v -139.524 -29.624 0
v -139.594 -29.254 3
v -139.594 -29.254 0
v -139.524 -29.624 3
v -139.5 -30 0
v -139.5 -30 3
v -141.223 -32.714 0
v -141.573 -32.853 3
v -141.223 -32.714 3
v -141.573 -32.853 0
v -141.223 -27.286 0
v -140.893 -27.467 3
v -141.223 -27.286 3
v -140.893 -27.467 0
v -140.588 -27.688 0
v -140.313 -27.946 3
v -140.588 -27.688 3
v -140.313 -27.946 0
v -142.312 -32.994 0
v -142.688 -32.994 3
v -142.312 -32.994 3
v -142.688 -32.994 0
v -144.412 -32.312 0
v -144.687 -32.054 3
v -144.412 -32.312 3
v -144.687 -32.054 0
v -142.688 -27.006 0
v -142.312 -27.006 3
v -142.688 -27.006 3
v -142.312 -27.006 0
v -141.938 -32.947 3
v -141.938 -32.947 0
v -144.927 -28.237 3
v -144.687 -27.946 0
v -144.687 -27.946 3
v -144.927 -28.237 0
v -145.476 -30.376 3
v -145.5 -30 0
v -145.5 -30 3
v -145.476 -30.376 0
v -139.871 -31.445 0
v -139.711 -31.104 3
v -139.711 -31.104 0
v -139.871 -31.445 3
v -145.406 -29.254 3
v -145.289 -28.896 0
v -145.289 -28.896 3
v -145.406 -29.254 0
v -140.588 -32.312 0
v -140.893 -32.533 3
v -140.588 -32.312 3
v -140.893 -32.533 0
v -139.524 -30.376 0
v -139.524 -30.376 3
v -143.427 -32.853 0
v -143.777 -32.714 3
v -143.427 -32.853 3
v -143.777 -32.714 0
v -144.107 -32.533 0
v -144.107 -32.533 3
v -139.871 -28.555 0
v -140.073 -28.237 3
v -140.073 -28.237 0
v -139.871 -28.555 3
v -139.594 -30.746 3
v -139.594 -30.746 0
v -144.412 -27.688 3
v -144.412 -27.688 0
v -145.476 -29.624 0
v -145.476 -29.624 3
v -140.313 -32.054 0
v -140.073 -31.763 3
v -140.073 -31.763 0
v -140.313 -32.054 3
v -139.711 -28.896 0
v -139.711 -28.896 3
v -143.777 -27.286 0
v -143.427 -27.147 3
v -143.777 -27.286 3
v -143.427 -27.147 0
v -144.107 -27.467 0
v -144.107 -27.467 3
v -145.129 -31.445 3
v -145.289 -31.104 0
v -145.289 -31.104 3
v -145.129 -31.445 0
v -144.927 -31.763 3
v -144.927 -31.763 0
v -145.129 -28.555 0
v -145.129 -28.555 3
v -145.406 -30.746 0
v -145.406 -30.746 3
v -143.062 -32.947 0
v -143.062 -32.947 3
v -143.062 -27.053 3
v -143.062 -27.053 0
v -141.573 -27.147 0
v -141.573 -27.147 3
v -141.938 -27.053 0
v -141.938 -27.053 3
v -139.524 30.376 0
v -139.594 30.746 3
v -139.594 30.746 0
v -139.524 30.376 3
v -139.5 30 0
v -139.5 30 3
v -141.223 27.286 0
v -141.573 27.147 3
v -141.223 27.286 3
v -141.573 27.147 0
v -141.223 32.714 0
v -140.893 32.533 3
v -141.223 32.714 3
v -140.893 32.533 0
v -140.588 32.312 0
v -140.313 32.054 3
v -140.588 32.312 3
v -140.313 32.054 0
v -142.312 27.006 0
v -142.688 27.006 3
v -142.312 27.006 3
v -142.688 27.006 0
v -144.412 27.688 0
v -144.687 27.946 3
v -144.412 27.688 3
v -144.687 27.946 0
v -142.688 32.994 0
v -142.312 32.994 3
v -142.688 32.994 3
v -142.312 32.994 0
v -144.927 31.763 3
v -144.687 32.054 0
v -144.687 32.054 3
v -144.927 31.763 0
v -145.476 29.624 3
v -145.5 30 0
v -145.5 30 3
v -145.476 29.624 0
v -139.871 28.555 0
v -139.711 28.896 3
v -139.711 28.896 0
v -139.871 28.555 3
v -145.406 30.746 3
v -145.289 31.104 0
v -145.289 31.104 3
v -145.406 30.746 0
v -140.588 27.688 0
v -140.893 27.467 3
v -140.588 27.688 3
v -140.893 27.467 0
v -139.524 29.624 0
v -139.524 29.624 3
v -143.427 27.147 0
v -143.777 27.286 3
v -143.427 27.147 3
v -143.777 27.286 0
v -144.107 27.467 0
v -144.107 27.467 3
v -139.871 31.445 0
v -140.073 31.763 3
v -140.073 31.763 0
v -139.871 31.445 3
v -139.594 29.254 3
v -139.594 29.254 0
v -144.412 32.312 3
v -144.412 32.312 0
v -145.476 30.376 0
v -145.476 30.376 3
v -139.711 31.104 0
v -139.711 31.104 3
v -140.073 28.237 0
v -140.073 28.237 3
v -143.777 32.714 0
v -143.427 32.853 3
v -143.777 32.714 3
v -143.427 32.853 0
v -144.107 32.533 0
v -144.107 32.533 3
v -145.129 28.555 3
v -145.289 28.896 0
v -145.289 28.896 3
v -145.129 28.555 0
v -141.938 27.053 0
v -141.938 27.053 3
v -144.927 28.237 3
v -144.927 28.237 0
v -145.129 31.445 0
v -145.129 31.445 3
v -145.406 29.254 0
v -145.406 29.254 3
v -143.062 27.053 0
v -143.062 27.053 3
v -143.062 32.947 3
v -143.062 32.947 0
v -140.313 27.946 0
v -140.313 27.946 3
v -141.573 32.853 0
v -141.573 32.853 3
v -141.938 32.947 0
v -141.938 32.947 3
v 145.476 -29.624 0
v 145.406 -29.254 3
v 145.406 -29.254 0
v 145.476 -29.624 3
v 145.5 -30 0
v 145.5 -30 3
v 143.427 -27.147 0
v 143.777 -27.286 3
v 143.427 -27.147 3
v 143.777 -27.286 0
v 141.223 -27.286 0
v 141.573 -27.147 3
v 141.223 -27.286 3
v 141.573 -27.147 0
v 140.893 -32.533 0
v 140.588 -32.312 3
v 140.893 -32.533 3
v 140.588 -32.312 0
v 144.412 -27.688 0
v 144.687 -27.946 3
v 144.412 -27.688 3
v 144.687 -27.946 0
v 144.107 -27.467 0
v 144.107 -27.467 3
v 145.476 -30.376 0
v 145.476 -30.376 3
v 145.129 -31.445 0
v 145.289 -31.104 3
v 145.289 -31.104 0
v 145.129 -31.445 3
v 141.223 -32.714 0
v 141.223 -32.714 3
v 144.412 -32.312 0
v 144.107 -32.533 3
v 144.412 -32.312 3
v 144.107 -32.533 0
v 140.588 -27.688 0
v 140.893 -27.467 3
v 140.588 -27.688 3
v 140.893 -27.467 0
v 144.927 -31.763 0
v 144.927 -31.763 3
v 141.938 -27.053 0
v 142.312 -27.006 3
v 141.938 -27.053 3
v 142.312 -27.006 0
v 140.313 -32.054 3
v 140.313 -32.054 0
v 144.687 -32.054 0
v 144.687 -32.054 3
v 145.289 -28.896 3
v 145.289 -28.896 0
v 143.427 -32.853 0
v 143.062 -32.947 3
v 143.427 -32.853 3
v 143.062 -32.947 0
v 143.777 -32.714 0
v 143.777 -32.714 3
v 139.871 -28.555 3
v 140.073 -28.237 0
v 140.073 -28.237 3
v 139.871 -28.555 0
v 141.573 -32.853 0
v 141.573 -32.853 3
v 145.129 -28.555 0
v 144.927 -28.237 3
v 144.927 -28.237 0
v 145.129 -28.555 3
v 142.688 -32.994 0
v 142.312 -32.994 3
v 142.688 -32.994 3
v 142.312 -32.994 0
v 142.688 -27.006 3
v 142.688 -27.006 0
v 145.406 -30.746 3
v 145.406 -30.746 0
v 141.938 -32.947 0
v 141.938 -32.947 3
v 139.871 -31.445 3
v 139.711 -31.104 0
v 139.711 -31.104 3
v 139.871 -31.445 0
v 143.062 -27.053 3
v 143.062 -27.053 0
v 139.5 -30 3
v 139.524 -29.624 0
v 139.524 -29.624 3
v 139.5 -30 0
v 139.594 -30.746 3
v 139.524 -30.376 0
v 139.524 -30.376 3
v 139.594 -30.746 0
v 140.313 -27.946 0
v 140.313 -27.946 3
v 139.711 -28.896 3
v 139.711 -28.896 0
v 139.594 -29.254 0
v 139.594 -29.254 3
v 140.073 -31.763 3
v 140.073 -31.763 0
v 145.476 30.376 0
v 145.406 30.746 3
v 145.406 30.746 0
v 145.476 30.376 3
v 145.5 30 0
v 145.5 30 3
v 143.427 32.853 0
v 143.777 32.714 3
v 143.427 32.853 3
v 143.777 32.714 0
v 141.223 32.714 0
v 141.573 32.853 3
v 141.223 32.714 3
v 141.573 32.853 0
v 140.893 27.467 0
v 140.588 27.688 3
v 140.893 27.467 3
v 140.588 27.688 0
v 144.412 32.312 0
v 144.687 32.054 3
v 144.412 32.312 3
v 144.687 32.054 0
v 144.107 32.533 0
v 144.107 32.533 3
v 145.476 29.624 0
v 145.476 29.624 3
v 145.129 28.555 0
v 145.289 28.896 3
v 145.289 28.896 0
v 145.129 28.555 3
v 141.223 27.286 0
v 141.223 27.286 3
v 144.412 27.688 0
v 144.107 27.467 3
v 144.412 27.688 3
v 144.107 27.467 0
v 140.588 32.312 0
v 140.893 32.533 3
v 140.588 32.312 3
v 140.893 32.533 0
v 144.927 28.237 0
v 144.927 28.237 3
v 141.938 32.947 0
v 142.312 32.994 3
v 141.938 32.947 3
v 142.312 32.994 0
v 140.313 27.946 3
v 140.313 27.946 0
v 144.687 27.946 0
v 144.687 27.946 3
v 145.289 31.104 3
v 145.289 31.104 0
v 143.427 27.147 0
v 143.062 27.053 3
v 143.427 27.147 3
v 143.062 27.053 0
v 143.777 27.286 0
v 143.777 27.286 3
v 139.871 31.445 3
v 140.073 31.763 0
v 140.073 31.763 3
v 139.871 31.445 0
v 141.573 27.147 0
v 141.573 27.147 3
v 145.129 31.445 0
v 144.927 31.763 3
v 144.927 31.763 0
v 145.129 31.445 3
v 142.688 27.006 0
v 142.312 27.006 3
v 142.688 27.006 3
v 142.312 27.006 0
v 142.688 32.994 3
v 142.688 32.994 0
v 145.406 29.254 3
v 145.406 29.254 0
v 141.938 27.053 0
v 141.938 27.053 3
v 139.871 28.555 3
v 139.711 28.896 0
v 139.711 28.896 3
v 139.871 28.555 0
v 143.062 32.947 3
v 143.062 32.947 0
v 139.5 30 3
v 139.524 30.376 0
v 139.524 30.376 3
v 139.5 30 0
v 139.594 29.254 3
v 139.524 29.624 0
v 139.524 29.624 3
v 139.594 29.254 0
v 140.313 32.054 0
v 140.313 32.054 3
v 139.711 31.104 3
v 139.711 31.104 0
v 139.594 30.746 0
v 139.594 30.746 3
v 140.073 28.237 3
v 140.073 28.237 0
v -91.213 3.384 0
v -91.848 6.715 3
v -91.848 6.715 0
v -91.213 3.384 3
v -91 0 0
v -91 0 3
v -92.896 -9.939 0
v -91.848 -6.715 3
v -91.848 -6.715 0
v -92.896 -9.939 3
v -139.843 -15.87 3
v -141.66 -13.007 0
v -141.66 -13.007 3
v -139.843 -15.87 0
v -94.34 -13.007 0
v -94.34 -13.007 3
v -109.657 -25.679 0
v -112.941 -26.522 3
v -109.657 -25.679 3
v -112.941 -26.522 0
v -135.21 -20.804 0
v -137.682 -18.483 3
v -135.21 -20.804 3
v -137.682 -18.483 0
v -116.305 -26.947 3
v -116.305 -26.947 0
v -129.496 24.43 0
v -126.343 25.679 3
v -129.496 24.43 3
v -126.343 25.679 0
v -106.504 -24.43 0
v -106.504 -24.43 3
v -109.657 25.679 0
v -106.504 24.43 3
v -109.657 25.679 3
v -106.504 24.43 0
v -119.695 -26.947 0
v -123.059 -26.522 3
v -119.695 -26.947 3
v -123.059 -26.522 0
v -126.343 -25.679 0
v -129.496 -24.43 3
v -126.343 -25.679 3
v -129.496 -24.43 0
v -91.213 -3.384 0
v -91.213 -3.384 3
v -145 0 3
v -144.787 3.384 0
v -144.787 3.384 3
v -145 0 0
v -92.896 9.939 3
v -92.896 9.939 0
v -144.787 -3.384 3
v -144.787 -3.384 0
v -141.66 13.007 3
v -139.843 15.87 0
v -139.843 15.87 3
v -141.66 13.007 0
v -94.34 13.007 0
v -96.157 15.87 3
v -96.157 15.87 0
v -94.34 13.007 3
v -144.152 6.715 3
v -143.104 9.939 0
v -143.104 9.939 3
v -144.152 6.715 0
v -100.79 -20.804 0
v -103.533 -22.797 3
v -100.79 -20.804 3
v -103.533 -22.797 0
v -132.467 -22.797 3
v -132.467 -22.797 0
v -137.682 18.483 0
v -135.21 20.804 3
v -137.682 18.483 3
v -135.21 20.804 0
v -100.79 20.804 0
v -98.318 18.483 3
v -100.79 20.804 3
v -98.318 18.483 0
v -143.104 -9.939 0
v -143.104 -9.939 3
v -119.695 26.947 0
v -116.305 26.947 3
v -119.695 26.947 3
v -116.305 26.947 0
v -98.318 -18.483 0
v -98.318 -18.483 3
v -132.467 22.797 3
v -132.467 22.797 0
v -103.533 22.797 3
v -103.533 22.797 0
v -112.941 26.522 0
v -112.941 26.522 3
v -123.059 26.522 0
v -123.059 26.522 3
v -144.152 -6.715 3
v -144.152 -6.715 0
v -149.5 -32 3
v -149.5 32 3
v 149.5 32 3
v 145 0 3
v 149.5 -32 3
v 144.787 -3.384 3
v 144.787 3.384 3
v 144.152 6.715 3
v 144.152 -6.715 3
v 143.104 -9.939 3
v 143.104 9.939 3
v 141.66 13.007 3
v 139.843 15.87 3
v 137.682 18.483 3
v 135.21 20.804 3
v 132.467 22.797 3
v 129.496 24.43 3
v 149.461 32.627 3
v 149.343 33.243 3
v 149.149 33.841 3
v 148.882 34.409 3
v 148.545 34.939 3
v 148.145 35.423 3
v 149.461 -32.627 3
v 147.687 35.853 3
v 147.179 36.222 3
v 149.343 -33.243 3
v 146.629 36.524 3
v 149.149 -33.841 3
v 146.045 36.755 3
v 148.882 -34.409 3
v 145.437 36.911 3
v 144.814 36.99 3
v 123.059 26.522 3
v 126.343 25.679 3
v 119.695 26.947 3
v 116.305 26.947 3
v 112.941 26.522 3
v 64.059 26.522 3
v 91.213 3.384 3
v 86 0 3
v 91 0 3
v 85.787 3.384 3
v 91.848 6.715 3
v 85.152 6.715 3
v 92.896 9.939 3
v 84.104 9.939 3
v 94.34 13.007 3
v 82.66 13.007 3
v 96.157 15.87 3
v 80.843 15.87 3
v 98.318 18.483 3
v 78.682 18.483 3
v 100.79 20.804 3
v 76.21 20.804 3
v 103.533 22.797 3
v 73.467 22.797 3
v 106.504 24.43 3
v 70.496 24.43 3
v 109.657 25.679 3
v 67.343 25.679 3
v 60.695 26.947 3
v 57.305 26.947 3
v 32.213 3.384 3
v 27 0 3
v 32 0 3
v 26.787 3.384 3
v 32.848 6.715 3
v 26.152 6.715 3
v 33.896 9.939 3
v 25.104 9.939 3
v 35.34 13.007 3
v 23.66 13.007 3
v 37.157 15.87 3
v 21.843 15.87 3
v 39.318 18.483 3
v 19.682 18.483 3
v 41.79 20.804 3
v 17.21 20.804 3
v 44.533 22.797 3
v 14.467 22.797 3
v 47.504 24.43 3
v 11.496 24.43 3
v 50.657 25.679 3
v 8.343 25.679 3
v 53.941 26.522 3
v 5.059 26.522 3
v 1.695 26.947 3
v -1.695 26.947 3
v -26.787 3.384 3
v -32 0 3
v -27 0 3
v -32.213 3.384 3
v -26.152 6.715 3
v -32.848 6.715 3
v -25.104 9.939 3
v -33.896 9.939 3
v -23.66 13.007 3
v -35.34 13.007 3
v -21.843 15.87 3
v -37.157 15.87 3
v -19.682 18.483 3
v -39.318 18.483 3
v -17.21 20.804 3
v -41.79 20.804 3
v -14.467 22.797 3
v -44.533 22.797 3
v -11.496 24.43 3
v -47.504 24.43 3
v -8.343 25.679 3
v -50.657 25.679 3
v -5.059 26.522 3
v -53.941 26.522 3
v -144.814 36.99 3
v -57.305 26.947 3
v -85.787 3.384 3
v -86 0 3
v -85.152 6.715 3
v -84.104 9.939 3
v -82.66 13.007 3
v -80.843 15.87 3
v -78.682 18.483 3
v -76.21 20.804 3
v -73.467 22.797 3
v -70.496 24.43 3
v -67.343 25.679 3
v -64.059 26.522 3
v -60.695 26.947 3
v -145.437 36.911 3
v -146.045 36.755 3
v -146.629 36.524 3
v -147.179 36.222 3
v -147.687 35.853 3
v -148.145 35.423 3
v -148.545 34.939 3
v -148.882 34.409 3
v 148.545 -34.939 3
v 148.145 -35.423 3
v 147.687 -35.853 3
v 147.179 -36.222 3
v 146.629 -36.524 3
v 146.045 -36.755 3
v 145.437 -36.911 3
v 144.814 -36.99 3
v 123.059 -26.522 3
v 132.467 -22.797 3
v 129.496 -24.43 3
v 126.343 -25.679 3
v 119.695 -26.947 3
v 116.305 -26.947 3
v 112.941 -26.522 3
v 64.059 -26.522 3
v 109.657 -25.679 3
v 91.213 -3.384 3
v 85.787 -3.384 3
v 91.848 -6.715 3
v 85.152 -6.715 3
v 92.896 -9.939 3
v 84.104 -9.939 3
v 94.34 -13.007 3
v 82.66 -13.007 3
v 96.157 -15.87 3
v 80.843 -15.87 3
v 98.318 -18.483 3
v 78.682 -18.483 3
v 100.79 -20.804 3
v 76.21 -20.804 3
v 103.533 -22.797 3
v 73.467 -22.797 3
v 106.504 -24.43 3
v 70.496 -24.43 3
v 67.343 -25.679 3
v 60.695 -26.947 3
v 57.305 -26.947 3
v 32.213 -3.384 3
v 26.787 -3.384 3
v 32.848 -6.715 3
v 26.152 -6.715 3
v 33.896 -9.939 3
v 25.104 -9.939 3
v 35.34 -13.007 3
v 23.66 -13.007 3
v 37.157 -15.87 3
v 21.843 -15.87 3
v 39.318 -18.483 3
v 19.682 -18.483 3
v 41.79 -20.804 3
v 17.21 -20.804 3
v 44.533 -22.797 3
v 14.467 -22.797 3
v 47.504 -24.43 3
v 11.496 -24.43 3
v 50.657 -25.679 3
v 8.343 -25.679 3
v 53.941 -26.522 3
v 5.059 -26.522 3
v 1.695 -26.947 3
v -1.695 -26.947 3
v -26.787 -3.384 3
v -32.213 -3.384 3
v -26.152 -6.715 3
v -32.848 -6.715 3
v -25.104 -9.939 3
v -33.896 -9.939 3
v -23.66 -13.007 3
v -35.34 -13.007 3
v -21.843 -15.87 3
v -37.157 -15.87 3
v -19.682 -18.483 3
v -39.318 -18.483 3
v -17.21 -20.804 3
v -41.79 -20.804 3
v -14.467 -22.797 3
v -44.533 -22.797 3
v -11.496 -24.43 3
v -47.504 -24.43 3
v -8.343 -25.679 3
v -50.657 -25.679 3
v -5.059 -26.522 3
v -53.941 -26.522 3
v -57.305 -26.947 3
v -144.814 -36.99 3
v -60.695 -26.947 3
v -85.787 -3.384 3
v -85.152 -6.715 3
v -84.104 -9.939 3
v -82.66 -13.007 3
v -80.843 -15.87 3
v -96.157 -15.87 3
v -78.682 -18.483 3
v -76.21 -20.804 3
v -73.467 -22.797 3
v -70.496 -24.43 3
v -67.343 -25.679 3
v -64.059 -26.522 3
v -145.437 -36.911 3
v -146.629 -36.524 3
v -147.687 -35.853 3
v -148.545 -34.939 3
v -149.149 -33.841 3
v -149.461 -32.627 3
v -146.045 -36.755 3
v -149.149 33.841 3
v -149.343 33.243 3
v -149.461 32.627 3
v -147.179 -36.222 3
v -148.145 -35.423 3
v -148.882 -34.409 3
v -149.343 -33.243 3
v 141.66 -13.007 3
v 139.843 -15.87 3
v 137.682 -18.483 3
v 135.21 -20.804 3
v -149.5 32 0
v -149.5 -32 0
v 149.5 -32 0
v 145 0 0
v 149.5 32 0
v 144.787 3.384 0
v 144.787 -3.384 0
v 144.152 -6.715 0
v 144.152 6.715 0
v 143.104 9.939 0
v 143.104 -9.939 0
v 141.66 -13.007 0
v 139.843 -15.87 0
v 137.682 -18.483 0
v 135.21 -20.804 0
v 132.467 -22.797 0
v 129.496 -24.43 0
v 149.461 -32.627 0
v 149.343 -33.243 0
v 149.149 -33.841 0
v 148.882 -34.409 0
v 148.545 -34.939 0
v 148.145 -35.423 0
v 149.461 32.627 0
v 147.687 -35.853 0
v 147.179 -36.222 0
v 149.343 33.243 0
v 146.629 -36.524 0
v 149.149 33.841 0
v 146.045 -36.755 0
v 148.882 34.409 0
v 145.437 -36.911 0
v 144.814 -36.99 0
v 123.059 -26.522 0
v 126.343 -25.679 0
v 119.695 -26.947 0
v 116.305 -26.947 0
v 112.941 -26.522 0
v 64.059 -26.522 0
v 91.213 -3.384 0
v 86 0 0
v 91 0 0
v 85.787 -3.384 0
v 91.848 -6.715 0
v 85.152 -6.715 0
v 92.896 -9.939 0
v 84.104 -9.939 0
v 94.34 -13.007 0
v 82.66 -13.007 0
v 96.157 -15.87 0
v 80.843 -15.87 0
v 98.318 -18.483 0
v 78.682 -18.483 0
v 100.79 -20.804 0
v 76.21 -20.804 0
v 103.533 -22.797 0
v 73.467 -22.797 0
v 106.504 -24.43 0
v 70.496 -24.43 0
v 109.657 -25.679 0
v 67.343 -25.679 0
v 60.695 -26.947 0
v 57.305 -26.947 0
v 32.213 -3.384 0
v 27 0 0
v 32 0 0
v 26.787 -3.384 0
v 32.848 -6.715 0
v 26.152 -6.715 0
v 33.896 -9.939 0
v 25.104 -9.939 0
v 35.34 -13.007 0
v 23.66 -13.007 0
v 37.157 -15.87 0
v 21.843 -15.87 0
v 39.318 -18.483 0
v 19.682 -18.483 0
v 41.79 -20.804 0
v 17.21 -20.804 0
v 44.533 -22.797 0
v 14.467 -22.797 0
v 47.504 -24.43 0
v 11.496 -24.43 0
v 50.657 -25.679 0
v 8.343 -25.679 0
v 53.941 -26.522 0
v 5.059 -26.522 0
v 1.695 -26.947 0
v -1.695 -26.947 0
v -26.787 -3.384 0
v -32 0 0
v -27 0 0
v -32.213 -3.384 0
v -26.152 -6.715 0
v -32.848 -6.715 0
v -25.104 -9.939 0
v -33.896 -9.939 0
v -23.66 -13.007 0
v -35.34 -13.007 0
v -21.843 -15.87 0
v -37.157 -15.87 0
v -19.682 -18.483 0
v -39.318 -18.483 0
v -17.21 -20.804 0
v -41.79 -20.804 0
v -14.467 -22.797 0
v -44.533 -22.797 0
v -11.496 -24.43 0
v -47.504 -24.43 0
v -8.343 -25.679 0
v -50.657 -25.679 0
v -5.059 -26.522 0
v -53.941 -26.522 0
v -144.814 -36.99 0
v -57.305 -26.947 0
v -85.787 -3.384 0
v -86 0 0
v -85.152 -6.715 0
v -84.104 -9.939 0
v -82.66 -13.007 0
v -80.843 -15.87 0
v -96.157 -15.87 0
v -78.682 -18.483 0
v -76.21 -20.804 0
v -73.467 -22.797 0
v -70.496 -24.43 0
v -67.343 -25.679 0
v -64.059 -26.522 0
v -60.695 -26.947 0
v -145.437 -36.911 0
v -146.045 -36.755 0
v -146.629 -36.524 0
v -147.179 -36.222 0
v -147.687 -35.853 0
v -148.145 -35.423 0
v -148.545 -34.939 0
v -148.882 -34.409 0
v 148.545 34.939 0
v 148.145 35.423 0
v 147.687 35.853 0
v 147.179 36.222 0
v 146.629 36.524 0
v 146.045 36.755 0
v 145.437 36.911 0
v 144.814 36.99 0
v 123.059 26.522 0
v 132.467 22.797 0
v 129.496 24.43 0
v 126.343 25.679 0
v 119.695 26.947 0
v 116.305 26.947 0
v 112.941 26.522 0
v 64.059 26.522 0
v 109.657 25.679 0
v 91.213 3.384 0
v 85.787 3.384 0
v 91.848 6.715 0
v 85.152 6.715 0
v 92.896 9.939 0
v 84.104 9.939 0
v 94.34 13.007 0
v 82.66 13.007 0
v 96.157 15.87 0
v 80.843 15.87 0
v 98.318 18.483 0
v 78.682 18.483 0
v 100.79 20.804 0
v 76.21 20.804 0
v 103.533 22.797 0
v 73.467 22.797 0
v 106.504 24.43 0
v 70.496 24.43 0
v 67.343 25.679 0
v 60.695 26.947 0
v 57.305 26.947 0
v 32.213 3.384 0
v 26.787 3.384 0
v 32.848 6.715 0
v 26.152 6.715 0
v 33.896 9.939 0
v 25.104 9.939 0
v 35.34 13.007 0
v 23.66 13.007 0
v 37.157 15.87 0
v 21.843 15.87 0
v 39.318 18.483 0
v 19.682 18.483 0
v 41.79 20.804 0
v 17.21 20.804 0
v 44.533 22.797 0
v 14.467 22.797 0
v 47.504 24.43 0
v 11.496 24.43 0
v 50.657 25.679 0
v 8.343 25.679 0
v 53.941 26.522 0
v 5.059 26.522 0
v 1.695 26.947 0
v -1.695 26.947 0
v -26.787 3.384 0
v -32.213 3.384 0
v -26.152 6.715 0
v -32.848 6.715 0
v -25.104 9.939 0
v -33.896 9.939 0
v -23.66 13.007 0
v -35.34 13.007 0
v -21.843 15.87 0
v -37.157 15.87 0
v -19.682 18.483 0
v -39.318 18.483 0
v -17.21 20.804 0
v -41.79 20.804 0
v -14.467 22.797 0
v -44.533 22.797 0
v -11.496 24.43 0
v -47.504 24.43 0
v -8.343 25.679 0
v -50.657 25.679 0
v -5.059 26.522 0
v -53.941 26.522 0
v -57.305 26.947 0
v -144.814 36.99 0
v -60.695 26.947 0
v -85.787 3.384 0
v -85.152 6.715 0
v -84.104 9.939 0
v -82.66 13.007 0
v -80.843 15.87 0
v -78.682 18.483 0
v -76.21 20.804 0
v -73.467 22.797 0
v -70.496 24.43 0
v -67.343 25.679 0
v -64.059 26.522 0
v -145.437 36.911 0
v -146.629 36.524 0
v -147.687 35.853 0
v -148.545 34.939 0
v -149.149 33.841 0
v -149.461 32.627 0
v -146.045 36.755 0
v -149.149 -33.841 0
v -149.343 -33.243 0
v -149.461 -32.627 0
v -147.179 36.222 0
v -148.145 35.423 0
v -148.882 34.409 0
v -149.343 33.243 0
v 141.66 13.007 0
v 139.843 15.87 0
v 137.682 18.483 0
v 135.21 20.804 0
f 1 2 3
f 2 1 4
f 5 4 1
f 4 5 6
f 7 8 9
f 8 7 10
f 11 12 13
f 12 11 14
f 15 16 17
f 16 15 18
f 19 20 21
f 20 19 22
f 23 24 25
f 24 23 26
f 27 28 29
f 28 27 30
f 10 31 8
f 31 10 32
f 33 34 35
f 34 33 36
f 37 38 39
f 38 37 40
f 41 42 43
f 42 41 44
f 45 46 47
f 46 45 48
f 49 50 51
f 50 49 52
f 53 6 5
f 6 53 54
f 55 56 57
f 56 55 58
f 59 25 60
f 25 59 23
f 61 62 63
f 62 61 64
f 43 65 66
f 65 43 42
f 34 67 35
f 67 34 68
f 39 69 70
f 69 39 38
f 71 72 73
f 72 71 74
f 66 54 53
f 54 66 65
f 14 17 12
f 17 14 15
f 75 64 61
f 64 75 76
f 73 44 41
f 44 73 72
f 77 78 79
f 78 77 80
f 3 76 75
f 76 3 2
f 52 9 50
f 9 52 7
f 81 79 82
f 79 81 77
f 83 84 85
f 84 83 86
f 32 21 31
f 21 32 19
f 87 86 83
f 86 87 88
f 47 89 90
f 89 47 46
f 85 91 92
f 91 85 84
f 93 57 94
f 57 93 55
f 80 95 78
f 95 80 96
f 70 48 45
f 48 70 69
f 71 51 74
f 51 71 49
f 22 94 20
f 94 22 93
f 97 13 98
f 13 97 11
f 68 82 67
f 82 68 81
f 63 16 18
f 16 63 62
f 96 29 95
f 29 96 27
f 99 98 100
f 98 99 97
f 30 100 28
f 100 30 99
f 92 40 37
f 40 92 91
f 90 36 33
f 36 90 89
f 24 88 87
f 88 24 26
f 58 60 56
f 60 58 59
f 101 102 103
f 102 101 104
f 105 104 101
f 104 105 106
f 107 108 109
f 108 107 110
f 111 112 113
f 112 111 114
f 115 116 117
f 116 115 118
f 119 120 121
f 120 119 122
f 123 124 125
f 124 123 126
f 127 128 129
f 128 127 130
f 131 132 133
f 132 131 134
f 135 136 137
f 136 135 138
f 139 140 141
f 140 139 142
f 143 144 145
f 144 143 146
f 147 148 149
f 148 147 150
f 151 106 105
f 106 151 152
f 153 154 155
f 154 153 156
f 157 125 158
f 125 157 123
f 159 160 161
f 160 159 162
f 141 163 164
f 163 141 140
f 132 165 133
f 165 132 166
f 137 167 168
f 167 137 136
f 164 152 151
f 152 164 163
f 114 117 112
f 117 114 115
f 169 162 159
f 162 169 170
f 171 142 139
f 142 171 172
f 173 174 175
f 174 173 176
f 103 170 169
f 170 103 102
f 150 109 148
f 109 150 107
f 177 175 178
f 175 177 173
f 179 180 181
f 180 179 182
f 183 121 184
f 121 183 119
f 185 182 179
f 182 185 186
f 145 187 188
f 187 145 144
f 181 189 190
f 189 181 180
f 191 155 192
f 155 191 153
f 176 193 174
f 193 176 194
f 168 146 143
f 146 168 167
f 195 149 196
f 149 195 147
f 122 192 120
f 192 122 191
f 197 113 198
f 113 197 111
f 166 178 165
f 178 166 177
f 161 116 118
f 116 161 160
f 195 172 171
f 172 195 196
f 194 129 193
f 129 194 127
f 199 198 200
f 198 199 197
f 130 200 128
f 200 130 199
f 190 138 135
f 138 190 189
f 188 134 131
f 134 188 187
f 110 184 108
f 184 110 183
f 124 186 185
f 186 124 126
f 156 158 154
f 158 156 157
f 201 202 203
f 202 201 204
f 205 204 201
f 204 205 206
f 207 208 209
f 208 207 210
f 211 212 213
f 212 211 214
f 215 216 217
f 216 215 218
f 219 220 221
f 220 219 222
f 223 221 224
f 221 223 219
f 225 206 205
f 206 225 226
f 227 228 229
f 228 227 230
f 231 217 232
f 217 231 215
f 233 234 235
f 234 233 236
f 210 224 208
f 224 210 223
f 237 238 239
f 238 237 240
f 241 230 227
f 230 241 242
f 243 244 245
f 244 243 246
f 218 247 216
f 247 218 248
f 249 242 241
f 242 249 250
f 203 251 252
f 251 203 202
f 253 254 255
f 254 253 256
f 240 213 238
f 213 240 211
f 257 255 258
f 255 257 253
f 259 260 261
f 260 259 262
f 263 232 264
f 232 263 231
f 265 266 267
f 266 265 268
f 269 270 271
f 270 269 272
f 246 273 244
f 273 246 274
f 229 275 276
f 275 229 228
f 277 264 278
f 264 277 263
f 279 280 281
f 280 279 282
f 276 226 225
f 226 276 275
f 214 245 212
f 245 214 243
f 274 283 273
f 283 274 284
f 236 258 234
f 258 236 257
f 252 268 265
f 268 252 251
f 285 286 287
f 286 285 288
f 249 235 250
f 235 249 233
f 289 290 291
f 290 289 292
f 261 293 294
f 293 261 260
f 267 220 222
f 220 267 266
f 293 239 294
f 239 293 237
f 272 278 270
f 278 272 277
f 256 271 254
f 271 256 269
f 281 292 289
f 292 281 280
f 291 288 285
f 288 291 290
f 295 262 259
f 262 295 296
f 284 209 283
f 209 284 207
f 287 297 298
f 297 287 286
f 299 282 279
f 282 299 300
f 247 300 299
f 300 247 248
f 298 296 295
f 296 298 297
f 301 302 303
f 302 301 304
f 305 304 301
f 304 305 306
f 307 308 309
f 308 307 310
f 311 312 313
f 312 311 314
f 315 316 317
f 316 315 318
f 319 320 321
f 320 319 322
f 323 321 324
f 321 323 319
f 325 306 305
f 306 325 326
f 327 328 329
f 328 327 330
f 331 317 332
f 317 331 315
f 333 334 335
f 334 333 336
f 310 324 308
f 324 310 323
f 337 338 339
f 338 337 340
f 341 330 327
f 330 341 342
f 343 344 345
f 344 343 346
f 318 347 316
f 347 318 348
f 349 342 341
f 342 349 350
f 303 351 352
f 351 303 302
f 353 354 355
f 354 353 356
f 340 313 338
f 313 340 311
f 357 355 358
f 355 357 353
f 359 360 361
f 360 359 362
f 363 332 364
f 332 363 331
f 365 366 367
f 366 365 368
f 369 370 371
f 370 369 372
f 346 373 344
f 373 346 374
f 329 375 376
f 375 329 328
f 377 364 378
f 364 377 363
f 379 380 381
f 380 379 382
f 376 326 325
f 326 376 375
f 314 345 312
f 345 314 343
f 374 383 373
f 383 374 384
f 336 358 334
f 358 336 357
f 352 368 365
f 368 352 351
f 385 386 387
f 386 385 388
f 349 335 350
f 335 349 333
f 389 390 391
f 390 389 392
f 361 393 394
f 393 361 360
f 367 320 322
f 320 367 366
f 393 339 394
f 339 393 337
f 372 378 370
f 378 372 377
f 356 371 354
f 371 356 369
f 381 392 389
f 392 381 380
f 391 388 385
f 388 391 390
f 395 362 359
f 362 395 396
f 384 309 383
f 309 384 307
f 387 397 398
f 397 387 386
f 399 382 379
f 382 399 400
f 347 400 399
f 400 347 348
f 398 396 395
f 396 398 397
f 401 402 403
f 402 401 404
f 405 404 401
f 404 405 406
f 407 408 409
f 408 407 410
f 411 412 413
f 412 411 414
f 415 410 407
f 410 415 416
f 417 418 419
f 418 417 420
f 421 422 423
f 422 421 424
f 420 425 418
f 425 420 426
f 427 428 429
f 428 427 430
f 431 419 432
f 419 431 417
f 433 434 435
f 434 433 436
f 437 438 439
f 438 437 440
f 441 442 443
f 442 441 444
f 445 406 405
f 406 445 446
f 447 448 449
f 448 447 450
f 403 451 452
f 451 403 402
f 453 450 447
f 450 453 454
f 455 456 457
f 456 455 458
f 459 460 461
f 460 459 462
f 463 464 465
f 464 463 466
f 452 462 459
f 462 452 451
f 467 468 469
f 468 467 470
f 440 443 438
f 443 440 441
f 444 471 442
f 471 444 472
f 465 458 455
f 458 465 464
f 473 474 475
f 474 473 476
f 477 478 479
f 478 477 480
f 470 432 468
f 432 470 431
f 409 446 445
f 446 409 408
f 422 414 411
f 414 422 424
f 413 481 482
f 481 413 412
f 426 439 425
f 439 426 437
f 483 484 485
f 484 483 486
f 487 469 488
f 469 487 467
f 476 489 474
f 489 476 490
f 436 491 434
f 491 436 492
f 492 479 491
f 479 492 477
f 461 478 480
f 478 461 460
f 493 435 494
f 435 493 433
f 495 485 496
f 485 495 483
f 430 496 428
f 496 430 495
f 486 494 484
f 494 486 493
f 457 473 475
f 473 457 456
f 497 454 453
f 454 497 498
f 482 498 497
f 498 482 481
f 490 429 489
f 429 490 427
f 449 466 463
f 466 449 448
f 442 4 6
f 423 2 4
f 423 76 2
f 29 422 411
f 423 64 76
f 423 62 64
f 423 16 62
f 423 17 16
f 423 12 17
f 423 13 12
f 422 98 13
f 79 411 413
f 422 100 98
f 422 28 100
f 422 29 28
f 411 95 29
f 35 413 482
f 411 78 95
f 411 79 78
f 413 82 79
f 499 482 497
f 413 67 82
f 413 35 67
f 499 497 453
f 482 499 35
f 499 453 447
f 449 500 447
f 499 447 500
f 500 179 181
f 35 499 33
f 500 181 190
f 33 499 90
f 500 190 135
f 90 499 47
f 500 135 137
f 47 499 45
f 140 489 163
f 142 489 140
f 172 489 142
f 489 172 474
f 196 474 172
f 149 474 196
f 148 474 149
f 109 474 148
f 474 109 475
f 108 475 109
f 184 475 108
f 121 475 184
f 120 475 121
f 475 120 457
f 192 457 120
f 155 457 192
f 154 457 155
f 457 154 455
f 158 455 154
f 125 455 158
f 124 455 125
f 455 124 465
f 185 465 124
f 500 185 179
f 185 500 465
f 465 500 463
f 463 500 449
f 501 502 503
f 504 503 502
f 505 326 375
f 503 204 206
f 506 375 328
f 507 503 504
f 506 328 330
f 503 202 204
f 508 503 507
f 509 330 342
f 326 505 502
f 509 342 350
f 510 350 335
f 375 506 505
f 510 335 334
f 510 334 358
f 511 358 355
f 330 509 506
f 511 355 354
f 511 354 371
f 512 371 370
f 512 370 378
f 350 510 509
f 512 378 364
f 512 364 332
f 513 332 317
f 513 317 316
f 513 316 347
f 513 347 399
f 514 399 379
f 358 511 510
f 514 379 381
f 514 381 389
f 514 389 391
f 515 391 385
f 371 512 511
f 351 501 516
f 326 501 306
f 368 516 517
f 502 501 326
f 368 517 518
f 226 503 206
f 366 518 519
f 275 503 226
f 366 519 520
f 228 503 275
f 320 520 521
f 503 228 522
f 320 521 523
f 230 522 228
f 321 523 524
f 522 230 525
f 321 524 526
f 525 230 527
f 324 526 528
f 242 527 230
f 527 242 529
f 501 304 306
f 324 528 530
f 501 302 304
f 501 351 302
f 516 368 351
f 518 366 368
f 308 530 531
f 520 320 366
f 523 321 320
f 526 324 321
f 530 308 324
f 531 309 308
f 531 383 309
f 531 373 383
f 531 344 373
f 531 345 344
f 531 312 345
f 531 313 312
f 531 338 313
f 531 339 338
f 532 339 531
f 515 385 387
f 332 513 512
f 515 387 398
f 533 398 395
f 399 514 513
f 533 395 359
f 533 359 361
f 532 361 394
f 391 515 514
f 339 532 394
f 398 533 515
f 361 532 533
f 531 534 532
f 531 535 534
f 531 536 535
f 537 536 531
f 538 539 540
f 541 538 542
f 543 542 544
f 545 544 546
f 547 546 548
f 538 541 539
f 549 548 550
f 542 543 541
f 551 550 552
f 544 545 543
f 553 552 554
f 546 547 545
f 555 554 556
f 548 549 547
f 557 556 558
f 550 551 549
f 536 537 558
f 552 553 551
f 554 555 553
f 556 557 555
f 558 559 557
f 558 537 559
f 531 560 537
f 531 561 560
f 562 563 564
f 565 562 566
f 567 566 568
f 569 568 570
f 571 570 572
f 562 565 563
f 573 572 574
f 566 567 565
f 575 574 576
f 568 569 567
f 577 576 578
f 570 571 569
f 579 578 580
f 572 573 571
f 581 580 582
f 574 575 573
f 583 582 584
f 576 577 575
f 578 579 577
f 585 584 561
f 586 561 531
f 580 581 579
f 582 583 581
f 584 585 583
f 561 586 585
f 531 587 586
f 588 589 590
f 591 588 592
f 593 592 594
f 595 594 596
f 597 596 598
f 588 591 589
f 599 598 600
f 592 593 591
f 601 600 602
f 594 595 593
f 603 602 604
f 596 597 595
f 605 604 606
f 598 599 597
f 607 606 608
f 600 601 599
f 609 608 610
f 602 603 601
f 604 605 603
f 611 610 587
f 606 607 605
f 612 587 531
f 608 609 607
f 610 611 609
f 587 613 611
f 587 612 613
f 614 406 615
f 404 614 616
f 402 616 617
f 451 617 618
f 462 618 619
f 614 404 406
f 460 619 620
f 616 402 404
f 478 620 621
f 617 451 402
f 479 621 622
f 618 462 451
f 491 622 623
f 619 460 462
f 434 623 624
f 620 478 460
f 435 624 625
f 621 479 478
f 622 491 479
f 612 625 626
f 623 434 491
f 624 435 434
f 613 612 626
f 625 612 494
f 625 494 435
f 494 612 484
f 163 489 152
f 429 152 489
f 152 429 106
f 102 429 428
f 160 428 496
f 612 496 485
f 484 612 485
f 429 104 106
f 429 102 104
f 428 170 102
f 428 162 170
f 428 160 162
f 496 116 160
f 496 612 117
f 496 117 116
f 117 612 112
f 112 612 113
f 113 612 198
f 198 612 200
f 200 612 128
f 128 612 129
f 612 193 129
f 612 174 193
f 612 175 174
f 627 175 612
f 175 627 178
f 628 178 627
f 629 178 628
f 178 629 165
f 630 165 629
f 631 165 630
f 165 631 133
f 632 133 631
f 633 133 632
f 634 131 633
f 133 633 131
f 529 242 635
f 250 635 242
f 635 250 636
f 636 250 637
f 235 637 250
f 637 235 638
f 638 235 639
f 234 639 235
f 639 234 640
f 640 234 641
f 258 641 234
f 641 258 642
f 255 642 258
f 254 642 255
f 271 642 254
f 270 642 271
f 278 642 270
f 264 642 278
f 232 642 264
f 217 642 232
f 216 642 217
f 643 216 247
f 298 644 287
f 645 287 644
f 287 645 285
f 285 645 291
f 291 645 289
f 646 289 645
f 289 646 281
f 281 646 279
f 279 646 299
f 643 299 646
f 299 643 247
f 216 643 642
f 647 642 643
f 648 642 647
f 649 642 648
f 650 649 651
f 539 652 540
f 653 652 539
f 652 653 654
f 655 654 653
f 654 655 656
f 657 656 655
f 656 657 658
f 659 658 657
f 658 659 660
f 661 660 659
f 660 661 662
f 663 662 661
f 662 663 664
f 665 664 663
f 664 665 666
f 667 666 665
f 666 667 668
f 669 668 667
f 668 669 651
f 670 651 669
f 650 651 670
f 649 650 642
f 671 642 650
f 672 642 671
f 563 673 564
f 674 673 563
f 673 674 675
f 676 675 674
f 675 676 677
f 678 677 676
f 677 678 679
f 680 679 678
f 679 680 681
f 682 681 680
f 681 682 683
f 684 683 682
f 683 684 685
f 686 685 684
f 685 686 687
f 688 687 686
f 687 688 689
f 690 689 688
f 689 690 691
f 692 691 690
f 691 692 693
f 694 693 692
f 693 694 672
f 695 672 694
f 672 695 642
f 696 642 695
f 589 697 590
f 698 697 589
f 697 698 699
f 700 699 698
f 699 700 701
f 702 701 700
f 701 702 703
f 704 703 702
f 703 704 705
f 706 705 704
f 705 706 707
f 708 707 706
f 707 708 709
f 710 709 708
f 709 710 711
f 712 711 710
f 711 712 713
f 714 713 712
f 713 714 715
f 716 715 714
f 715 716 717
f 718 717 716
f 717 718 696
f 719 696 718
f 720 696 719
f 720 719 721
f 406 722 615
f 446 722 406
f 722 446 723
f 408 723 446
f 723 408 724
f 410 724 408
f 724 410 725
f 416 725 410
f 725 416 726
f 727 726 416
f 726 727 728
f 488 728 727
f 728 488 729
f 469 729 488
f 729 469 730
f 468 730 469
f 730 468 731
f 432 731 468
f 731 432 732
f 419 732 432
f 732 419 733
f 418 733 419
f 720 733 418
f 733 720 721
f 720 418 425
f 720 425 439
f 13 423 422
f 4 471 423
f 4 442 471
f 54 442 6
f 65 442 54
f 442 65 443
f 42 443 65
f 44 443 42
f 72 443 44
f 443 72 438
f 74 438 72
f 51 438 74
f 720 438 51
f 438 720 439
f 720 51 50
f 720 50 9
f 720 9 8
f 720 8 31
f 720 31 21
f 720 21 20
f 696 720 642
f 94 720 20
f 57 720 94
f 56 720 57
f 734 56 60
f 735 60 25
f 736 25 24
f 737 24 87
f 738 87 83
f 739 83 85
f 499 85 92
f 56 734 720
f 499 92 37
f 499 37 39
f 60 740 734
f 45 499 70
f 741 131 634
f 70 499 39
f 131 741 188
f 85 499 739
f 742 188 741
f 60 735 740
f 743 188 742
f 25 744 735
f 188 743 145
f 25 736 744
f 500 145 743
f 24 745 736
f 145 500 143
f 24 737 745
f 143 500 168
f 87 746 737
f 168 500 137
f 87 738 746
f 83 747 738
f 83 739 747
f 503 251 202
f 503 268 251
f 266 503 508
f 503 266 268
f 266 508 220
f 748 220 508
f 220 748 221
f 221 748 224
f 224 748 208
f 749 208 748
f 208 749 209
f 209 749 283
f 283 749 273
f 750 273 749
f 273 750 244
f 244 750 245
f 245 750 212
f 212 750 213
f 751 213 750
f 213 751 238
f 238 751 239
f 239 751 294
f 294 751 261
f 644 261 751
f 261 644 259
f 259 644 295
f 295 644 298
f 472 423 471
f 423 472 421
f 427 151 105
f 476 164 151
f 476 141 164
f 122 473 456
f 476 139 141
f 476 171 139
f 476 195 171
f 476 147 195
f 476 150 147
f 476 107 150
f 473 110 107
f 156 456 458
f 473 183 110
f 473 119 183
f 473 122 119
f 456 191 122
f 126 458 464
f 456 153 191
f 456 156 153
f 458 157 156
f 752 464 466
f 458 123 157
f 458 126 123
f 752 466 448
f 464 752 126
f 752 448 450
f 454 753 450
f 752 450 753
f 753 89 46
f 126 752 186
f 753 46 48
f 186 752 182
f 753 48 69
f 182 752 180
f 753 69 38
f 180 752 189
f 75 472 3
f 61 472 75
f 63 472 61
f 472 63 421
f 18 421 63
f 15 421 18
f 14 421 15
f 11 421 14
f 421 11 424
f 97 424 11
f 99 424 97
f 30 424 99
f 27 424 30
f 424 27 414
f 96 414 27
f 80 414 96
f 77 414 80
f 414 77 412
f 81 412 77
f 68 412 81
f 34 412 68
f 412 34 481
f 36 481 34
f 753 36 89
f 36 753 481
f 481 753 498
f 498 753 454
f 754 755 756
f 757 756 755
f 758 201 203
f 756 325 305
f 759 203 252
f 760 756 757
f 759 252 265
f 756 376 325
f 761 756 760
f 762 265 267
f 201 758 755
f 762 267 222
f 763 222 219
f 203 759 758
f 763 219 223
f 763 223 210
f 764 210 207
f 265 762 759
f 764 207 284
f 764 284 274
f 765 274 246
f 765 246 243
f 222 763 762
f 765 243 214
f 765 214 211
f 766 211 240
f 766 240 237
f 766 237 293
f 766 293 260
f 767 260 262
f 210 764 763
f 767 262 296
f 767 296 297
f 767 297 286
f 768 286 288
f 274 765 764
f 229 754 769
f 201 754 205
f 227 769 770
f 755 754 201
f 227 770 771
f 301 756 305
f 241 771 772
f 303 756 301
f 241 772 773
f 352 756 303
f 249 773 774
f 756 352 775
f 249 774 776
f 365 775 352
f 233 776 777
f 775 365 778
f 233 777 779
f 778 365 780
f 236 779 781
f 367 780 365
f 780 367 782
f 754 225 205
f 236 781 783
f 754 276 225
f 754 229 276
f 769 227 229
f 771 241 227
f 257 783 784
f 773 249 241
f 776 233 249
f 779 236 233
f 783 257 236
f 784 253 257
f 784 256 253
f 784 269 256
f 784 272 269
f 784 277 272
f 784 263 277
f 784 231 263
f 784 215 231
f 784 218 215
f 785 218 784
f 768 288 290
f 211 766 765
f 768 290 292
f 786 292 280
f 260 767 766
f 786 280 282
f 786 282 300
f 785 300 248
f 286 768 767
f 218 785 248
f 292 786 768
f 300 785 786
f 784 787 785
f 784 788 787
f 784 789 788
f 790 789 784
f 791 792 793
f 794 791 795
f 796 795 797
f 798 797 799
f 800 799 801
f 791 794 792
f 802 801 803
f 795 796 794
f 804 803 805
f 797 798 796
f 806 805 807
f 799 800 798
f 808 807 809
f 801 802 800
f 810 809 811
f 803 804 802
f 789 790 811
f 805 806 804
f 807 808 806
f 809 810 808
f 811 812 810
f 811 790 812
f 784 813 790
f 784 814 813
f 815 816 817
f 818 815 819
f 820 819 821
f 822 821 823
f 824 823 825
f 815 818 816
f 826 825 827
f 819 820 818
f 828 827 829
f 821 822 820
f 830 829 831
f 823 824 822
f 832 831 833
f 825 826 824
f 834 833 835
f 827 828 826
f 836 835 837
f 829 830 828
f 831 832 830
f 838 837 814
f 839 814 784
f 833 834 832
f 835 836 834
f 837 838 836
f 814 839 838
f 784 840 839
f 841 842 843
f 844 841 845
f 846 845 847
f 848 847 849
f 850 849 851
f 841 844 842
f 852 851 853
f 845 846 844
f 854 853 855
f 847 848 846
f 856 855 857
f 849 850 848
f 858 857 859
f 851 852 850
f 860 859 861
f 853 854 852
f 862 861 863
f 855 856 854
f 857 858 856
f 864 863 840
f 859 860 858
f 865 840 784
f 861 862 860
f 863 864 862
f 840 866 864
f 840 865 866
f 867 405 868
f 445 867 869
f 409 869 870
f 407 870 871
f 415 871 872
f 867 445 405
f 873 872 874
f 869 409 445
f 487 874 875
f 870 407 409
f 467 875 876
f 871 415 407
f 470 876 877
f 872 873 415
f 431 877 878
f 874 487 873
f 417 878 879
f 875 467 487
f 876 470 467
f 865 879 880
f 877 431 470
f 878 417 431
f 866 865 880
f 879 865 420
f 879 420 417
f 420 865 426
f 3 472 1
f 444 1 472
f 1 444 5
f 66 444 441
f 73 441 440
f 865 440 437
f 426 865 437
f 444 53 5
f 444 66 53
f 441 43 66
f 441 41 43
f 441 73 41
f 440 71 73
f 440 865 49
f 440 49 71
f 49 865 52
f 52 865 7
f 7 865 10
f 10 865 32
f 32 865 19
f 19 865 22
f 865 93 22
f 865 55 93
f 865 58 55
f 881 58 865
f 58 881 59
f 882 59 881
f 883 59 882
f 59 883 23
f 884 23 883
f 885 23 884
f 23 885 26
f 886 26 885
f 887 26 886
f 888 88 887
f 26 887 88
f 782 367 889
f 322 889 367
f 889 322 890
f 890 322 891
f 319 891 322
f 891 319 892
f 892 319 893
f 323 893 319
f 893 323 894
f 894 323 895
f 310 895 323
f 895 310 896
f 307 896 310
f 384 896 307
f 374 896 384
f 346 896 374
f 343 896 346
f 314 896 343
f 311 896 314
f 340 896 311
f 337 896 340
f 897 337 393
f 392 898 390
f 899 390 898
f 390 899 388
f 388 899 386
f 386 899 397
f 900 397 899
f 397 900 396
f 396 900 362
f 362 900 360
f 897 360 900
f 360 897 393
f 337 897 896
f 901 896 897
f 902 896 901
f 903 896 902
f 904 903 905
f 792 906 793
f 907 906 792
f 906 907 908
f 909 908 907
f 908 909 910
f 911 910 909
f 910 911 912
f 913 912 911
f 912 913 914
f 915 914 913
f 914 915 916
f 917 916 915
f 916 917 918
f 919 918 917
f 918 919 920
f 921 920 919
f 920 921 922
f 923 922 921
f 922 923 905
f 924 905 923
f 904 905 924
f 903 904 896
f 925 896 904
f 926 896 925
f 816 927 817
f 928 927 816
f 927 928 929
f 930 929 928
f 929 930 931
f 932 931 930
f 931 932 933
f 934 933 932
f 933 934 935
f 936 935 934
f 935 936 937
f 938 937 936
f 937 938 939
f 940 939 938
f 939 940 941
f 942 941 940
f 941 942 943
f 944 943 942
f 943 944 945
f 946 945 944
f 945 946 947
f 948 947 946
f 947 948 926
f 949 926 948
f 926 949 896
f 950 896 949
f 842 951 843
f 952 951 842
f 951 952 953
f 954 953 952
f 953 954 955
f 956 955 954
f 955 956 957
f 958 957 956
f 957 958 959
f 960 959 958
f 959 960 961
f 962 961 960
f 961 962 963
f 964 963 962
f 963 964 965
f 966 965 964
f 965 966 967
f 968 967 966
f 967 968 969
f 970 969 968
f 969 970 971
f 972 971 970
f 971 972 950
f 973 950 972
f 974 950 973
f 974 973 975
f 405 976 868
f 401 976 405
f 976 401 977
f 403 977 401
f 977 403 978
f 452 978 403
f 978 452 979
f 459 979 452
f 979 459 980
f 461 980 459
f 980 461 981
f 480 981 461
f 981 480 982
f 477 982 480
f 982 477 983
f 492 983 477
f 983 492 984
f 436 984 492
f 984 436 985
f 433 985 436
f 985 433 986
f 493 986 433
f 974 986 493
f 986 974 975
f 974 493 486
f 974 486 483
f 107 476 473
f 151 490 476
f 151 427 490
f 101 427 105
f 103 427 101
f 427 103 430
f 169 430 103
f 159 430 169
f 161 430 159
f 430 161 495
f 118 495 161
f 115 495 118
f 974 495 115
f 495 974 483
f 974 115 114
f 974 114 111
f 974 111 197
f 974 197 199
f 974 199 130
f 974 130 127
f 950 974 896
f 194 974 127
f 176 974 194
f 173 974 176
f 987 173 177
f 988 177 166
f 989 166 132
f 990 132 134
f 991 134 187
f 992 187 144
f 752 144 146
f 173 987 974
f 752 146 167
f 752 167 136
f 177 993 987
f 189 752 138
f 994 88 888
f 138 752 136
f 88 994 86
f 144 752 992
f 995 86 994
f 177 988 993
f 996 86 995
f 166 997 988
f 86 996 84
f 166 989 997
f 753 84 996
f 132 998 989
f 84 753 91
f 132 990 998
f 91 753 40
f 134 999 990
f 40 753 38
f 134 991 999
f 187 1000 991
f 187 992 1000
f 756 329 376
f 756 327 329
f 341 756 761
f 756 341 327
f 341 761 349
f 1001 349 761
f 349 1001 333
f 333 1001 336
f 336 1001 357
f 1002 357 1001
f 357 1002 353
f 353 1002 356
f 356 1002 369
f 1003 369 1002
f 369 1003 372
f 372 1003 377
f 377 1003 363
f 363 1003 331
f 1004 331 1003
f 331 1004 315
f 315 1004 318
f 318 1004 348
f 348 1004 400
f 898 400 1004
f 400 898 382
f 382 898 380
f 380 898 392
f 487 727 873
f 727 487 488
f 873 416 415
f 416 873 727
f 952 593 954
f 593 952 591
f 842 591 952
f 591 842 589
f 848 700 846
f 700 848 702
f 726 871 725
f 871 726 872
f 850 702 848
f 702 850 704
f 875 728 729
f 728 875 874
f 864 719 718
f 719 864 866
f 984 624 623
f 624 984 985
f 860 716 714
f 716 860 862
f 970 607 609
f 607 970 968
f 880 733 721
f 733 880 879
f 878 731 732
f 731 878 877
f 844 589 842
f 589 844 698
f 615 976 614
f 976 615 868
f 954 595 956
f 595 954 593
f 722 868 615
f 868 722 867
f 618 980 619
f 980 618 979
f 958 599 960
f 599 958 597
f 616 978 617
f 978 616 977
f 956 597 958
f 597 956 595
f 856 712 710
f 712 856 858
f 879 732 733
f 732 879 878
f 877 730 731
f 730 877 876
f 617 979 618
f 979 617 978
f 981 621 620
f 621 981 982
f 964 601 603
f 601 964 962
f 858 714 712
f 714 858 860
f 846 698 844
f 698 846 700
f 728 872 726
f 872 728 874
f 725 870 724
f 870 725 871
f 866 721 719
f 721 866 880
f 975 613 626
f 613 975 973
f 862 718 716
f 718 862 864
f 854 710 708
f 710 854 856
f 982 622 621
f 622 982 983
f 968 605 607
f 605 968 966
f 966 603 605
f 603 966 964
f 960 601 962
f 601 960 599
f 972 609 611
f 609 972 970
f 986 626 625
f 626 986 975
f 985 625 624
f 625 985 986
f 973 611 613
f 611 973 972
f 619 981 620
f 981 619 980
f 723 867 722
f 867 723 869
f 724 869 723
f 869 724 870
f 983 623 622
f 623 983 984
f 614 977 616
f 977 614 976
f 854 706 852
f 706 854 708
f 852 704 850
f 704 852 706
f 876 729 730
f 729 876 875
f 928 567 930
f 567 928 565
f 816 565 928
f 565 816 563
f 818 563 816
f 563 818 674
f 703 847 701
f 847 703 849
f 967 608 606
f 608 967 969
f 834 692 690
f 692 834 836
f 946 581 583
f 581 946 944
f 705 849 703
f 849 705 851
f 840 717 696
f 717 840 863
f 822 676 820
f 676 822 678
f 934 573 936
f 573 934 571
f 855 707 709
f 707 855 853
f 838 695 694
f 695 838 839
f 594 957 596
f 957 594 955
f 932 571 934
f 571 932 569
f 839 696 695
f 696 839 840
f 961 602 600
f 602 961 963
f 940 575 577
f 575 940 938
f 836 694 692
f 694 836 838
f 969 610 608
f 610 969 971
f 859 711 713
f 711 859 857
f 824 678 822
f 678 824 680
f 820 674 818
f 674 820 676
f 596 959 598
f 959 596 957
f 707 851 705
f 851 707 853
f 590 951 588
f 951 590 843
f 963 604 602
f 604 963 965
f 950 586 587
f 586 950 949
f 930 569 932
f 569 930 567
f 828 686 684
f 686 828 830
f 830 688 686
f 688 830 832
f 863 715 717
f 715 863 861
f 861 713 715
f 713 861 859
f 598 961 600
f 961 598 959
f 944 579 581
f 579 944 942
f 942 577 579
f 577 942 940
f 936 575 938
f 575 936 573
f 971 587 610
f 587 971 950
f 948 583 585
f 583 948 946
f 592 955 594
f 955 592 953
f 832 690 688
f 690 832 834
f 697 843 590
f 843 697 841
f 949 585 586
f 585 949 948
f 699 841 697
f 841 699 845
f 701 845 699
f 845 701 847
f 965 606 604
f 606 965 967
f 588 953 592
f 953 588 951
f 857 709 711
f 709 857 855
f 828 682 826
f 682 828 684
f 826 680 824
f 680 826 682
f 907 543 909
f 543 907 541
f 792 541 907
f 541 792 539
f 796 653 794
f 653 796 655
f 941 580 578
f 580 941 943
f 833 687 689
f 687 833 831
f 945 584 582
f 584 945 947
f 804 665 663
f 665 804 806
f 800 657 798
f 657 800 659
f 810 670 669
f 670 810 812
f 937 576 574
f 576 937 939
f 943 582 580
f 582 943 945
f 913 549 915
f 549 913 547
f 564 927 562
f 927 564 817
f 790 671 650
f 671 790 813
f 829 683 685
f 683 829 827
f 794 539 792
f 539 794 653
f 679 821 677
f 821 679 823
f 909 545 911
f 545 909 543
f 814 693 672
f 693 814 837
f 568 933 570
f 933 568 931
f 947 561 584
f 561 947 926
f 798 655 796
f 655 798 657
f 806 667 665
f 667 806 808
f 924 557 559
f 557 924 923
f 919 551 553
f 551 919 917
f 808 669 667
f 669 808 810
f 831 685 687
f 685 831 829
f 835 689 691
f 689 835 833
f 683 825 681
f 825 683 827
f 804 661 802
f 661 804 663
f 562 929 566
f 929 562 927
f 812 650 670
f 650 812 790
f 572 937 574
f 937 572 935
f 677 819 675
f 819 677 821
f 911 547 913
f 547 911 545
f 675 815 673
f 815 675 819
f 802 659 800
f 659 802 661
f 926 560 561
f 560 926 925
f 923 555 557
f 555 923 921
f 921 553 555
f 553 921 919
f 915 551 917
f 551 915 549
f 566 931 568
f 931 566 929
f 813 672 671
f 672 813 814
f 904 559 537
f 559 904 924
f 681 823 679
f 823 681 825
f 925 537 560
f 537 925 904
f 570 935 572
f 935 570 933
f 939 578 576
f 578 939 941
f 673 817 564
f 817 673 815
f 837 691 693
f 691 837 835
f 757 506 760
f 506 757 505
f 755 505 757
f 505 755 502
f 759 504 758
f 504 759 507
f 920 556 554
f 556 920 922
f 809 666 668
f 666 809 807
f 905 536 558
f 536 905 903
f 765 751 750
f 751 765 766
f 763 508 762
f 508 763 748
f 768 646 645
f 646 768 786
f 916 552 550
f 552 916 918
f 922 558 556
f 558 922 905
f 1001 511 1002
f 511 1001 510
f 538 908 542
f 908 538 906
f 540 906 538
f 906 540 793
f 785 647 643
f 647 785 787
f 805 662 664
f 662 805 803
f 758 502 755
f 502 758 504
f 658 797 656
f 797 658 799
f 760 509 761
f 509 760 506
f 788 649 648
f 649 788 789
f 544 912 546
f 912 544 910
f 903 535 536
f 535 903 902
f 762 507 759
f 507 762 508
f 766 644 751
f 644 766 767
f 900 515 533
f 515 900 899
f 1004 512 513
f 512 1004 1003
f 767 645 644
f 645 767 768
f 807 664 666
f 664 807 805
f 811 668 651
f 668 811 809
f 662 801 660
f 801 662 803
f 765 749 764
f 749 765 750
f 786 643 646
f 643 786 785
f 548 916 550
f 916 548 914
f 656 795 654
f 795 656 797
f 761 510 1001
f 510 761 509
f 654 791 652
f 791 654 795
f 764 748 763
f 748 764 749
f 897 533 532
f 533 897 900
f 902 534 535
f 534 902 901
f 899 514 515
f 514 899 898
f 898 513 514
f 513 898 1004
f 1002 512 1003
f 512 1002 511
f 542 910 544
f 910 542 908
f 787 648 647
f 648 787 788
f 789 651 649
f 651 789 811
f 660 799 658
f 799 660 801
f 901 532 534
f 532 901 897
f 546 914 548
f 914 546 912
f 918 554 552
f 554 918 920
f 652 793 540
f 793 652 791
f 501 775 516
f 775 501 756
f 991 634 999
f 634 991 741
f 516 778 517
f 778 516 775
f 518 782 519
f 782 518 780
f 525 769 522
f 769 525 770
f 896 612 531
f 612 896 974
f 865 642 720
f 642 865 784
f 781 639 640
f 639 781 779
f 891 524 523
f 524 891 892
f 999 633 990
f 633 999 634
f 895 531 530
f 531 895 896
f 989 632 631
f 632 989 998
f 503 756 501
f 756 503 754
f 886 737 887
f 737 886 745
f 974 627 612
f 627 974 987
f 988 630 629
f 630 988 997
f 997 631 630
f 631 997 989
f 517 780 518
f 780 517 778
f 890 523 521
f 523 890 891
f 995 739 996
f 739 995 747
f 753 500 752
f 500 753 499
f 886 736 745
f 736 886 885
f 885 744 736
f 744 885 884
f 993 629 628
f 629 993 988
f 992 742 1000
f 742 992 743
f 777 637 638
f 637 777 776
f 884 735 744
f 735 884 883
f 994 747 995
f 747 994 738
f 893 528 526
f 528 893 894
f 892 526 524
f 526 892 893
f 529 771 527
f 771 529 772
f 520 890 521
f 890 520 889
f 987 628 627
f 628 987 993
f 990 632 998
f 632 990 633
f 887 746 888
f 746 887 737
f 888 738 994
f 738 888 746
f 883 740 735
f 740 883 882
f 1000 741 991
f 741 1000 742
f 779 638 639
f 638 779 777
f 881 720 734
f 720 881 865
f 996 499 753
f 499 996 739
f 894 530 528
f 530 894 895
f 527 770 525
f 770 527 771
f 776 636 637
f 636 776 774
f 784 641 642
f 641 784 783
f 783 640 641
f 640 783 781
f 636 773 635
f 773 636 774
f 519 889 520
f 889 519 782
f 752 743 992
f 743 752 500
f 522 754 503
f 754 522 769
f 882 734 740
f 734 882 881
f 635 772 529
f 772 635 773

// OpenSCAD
$fn = 50;


difference() {
	union() {
		hull() {
			translate(v = [-144.5000000000, 32.0000000000, 0]) {
				cylinder(h = 3, r = 5);
			}
			translate(v = [144.5000000000, 32.0000000000, 0]) {
				cylinder(h = 3, r = 5);
			}
			translate(v = [-144.5000000000, -32.0000000000, 0]) {
				cylinder(h = 3, r = 5);
			}
			translate(v = [144.5000000000, -32.0000000000, 0]) {
				cylinder(h = 3, r = 5);
			}
		}
	}
	union() {
		#translate(v = [-142.5000000000, -30.0000000000, -100.0000000000]) {
			cylinder(h = 200, r = 3.0000000000);
		}
		#translate(v = [-142.5000000000, 30.0000000000, -100.0000000000]) {
			cylinder(h = 200, r = 3.0000000000);
		}
		#translate(v = [142.5000000000, -30.0000000000, -100.0000000000]) {
			cylinder(h = 200, r = 3.0000000000);
		}
		#translate(v = [142.5000000000, 30.0000000000, -100.0000000000]) {
			cylinder(h = 200, r = 3.0000000000);
		}
		#translate(v = [-118.0000000000, 0, 0]) {
			cylinder(h = 3, r = 27.0000000000);
		}
		#translate(v = [-59.0000000000, 0, 0]) {
			cylinder(h = 3, r = 27.0000000000);
		}
		#cylinder(h = 3, r = 27.0000000000);
		#translate(v = [59.0000000000, 0, 0]) {
			cylinder(h = 3, r = 27.0000000000);
		}
		#translate(v = [118.0000000000, 0, 0]) {
			cylinder(h = 3, r = 27.0000000000);
		}
	}
}
